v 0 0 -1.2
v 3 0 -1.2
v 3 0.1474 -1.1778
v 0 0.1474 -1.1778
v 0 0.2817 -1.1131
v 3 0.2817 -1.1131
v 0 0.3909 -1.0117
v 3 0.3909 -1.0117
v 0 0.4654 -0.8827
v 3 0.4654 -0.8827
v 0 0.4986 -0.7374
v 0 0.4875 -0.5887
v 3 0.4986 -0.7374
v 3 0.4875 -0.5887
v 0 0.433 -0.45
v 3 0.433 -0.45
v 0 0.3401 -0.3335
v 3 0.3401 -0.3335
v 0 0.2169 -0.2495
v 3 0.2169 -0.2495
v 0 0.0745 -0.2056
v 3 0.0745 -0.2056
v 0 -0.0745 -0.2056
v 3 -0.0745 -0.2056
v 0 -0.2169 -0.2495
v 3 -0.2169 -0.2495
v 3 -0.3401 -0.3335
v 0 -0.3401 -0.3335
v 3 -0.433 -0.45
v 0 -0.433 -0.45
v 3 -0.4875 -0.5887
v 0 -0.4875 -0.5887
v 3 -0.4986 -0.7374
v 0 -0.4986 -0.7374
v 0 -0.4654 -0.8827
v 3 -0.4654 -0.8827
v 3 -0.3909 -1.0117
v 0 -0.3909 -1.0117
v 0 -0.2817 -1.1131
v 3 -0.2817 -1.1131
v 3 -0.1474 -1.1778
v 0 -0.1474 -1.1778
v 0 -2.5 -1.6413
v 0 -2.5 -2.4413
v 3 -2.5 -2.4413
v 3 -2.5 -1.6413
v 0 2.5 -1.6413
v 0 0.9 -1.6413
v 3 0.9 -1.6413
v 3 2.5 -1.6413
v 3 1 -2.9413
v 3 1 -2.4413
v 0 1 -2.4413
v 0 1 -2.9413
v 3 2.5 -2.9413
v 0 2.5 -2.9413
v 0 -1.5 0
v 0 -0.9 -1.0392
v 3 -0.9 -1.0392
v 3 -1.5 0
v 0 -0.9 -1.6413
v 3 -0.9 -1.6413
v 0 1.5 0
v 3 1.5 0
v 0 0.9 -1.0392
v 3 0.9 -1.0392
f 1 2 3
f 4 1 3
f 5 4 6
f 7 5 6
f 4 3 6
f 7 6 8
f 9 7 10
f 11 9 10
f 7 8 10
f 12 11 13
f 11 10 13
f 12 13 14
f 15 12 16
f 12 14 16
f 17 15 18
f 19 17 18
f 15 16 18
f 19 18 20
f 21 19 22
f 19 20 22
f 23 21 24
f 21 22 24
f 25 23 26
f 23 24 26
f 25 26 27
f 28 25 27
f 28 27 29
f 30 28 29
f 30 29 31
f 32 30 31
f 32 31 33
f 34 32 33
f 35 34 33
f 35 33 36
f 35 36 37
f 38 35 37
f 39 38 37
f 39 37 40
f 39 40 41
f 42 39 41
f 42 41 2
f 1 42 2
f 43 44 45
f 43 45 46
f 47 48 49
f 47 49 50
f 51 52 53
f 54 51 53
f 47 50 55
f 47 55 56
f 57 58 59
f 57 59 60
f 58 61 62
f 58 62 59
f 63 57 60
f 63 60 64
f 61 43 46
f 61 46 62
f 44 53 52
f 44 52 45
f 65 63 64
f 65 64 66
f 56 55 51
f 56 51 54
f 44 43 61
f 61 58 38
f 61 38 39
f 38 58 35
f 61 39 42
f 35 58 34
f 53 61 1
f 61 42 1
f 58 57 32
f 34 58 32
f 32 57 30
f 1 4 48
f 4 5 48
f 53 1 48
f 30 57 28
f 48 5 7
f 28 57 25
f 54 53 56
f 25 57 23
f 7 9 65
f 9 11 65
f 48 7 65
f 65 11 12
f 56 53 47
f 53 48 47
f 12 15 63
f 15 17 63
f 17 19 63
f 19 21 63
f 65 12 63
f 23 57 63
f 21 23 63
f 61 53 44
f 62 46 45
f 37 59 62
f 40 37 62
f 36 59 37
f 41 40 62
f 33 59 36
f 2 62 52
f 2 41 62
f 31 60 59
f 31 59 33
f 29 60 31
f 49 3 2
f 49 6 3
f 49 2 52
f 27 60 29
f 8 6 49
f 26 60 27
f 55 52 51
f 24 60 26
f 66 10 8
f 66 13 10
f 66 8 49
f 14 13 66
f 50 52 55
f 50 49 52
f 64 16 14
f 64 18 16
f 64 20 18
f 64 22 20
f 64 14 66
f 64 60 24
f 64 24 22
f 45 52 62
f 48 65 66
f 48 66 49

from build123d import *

# Parameters (mm, degrees)
BOSS_EXTRUDE1_DEPTH = 3
SKETCH2_R           = 0.5
CUT_EXTRUDE1_DEPTH  = 5.605420599
SKETCH3_W           = 3
SKETCH3_H           = 1.5
BOSS_EXTRUDE2_DEPTH = 0.5


with BuildPart() as part:
    # Sketch1 → Boss-Extrude1 (new body)
    with BuildSketch(Plane(origin=(0, 0, 0), x_dir=(0, 0, -1), z_dir=(1, 0, 0))):
        Polygon((0, -1.5), (0, 1.5), (1.039230485, 0.9), (1.641290416, 0.9), (1.641290416, 2.5), (2.441290416, 2.5), (2.441290416, -2.5), (1.641290416, -2.5), (1.641290416, -0.9), (1.039230485, -0.9), align=None)
    extrude(amount=BOSS_EXTRUDE1_DEPTH)

    # Sketch2 → Cut-Extrude1 (cut, through all)
    with BuildSketch(Plane(origin=(3, 0, 0), x_dir=(0, 0, -1), z_dir=(1, 0, 0))):
        with Locations((0.7, 0)):
            Circle(SKETCH2_R)
    extrude(amount=-CUT_EXTRUDE1_DEPTH, mode=Mode.SUBTRACT)

    # Sketch3 → Boss-Extrude2 (add)
    with BuildSketch(Plane(origin=(0, 0, -2.441290416), x_dir=(-1, 0, 0), z_dir=(0, 0, -1))):
        with Locations((-1.5, 1.75)):
            Rectangle(SKETCH3_W, SKETCH3_H)
    extrude(amount=BOSS_EXTRUDE2_DEPTH)


solid = part.part
